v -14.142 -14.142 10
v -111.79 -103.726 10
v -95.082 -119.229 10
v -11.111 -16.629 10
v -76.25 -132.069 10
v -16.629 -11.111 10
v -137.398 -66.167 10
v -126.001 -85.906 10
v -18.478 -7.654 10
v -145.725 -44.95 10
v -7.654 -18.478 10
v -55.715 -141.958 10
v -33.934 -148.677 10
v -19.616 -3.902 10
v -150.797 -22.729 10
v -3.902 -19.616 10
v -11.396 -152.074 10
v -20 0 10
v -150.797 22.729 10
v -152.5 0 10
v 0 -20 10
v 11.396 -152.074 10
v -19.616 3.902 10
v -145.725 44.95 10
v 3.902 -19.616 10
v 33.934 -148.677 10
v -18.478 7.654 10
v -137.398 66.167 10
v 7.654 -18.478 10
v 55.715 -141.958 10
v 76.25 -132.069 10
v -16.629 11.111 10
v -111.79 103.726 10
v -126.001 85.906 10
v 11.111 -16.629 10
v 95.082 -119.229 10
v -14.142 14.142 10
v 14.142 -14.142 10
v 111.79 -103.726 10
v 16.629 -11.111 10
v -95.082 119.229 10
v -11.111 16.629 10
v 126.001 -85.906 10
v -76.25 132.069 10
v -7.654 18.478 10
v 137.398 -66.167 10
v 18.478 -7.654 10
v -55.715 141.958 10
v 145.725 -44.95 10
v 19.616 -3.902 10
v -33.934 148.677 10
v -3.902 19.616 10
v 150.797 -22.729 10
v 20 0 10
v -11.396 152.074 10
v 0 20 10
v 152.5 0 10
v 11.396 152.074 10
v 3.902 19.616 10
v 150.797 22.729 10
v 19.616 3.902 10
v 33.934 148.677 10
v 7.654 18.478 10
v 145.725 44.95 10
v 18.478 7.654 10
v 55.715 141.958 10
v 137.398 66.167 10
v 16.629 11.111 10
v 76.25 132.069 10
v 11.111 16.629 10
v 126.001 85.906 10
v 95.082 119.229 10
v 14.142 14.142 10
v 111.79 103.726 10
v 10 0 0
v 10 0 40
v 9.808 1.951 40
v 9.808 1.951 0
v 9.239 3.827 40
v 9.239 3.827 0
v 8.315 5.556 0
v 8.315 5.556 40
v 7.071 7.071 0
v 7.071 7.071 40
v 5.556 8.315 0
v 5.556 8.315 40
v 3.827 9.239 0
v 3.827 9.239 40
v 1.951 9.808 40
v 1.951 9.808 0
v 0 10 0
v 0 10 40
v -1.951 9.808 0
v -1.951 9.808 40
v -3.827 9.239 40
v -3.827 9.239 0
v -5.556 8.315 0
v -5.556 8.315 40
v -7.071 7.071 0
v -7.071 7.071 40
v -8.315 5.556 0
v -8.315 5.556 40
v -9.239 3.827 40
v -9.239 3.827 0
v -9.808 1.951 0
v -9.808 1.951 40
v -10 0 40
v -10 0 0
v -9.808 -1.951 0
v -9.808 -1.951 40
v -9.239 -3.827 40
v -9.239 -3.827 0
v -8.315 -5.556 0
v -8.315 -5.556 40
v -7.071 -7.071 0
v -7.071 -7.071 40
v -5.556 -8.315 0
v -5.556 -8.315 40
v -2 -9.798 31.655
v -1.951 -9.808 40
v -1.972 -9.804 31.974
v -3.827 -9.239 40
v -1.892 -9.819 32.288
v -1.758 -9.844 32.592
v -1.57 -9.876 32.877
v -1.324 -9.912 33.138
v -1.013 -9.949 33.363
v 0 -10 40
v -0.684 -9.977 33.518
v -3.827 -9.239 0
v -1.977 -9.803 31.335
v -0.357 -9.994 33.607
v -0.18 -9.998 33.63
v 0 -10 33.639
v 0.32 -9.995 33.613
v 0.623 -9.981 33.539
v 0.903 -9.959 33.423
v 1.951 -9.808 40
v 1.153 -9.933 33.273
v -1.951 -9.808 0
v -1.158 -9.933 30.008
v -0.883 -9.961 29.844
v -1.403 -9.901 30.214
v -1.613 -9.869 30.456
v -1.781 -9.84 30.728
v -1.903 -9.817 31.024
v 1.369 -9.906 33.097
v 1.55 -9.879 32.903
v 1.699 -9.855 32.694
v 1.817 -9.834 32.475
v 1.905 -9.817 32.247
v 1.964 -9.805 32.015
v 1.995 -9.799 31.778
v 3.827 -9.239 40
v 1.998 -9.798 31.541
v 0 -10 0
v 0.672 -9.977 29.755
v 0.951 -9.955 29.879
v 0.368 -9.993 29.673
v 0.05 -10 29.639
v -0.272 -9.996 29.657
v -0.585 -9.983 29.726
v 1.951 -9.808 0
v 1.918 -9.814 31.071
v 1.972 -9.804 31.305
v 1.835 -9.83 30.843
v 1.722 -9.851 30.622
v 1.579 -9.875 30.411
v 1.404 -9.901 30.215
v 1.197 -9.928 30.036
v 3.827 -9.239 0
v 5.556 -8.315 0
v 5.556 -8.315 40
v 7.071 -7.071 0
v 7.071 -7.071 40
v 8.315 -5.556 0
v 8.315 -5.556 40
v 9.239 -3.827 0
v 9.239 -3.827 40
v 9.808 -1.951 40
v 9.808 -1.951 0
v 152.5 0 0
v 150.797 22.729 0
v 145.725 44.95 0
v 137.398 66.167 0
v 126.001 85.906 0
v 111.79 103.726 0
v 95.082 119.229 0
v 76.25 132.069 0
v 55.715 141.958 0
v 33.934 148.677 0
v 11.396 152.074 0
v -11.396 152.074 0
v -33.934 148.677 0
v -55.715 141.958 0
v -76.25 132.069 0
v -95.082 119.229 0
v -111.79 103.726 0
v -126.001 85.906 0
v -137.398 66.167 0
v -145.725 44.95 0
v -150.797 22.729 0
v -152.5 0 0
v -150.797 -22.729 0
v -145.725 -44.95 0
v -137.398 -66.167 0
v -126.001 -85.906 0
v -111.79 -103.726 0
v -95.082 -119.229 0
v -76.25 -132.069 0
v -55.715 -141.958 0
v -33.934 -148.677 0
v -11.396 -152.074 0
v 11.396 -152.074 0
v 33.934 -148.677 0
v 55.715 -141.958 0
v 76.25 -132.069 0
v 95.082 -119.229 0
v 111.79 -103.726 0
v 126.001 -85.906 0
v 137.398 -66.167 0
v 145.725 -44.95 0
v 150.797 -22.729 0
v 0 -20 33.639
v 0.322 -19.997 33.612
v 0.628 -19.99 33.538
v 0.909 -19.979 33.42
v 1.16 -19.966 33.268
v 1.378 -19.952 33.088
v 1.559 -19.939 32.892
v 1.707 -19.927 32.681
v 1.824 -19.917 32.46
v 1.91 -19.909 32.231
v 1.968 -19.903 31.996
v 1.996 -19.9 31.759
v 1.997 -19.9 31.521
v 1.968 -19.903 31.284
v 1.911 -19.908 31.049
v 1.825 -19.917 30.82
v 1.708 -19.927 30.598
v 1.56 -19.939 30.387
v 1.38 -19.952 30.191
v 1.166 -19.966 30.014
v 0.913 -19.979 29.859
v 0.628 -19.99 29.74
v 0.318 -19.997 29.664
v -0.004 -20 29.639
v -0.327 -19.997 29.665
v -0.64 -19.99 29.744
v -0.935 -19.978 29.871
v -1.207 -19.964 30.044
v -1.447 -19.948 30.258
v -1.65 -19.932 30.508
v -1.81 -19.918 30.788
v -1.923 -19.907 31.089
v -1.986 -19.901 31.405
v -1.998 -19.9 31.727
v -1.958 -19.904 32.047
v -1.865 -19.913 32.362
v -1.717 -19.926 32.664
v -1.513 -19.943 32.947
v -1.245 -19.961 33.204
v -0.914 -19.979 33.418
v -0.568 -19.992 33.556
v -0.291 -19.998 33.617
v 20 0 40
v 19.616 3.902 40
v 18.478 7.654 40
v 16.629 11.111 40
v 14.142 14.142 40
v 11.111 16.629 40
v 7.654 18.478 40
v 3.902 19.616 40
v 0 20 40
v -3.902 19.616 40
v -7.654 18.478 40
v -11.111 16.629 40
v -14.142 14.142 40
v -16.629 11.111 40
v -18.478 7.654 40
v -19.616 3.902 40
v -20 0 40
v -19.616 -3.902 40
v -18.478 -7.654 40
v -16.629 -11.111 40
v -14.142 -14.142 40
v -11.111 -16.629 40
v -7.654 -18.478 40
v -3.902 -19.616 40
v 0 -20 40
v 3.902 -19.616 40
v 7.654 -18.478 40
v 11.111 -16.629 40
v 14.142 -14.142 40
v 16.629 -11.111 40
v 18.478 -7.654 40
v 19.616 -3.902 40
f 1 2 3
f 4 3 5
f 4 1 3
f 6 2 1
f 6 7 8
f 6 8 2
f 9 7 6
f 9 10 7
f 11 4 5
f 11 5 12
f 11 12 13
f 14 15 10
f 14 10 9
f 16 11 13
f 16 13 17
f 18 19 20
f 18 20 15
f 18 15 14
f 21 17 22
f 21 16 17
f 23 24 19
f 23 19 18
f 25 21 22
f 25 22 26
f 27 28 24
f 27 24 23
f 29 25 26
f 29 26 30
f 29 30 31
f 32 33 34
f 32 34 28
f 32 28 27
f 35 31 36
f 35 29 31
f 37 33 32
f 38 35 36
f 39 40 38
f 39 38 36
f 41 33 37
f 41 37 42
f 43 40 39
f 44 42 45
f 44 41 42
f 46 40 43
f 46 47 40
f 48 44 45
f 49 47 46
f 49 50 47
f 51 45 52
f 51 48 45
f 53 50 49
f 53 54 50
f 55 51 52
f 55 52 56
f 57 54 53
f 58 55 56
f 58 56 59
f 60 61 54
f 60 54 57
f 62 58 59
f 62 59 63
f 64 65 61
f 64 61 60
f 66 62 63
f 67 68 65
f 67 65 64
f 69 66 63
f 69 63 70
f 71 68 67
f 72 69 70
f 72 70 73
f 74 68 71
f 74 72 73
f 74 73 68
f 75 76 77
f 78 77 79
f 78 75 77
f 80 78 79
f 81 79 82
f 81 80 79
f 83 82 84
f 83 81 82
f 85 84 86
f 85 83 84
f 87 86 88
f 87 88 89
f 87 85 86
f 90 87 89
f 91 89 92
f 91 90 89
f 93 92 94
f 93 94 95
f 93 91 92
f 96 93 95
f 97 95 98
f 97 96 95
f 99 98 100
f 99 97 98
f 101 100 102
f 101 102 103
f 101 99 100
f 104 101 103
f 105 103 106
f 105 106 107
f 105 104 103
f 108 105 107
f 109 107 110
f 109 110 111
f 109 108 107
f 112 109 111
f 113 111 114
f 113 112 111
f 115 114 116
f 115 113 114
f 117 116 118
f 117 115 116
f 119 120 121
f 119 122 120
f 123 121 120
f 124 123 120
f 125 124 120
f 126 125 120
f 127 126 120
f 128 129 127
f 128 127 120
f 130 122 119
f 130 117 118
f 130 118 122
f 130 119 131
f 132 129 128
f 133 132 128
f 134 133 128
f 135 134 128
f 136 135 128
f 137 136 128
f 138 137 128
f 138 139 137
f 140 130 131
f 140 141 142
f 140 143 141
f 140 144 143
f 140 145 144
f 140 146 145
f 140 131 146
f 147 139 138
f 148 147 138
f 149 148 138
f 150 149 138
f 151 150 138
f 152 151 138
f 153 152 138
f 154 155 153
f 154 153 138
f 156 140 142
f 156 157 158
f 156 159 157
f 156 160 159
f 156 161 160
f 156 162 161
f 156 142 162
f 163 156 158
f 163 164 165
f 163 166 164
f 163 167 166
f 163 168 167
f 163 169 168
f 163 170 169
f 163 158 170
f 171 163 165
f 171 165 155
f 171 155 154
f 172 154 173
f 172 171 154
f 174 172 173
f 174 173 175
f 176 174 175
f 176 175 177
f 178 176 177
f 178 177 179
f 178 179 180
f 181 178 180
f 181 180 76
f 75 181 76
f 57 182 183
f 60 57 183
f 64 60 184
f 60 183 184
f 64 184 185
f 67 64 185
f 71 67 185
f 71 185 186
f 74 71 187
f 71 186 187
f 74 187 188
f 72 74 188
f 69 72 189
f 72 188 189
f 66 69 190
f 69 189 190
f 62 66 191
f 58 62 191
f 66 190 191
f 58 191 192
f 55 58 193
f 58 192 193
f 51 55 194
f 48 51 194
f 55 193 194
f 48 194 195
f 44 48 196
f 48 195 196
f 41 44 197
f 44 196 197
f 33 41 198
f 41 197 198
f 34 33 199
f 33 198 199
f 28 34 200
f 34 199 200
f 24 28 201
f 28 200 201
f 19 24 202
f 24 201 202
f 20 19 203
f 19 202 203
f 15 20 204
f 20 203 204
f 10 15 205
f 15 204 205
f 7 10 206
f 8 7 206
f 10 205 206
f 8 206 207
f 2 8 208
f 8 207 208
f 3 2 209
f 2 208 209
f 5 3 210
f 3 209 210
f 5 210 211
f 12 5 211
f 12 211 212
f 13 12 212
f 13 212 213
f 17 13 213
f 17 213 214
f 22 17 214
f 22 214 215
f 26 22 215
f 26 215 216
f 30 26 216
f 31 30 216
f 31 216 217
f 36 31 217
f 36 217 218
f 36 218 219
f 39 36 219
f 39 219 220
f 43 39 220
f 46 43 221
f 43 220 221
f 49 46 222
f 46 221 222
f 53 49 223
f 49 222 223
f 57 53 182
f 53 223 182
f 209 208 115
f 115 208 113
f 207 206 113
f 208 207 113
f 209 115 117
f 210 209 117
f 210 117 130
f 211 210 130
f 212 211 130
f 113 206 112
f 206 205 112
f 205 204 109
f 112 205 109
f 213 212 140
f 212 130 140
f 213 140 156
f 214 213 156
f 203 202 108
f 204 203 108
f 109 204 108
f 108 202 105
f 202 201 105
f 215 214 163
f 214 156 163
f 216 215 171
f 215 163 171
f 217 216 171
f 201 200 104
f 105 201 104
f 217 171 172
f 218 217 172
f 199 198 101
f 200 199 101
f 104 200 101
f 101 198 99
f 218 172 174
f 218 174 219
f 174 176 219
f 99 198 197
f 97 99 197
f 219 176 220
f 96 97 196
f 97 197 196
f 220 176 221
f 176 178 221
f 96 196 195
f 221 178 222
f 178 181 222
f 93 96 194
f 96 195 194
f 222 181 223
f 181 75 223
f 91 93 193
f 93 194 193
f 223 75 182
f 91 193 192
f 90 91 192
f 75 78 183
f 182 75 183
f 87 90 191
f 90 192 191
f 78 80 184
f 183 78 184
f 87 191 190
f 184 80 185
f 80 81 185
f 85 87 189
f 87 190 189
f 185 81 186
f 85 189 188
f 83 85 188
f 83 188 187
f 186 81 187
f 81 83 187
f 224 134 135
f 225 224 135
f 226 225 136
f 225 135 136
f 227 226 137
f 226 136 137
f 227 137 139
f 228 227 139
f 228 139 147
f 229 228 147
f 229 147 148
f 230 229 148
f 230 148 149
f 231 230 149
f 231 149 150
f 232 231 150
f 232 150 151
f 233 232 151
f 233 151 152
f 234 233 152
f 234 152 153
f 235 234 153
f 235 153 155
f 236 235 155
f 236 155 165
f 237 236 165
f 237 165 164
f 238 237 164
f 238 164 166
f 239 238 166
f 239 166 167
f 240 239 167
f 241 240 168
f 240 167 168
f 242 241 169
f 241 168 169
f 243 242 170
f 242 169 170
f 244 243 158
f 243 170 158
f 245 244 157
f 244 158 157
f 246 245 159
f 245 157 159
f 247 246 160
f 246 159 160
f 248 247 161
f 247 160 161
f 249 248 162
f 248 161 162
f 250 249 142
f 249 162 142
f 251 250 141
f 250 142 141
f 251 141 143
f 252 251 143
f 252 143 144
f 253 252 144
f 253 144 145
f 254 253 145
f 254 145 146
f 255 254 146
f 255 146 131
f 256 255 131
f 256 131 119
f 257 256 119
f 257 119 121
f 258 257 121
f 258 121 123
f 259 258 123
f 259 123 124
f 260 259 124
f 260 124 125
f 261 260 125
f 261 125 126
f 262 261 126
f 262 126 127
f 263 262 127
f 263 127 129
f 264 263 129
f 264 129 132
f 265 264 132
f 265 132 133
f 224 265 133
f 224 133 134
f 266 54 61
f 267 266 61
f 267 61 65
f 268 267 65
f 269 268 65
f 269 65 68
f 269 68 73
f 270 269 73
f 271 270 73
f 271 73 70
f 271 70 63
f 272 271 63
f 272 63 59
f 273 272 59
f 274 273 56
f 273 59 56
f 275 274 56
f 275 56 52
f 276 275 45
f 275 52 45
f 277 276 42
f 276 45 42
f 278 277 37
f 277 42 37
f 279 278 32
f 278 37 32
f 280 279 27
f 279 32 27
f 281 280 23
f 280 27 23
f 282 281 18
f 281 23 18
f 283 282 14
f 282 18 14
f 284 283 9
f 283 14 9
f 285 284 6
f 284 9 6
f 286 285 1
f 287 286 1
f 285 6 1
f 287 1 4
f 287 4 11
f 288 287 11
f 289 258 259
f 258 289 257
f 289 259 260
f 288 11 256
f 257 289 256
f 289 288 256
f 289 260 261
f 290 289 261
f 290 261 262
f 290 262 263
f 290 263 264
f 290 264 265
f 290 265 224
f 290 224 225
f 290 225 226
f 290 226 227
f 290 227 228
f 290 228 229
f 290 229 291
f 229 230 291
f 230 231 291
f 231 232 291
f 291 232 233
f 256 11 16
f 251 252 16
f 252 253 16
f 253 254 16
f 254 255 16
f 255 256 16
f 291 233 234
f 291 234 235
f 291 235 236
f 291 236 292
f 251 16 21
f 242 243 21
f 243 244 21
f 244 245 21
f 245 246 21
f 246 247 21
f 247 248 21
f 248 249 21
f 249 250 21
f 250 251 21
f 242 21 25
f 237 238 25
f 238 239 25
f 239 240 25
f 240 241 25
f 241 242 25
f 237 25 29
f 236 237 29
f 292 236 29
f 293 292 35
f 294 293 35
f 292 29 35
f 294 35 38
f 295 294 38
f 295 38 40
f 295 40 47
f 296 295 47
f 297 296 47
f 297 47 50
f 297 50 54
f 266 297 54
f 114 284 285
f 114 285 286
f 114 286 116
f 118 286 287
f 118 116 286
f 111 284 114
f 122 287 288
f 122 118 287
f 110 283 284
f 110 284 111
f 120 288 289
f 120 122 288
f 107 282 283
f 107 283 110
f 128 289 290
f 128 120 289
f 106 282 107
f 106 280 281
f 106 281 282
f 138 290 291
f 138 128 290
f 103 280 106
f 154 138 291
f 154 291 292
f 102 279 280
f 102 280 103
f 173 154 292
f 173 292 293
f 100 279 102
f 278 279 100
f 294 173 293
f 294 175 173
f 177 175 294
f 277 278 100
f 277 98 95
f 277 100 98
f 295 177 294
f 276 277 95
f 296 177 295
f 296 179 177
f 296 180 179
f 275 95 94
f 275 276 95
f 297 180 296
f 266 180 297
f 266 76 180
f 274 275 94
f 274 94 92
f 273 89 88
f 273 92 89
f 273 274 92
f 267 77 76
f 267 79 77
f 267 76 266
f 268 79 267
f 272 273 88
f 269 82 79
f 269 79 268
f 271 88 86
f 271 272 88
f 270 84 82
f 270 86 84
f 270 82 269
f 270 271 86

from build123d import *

# Parameters (mm, degrees)
SKETCH1_R           = 152.5
SKETCH1_R_2         = 10
BOSS_EXTRUDE1_DEPTH = 10
SKETCH2_R           = 20
SKETCH2_R_2         = 10
BOSS_EXTRUDE2_DEPTH = 30
SKETCH3_R           = 2
CUT_EXTRUDE1_DEPTH  = 60


with BuildPart() as part:
    # Sketch1 → Boss-Extrude1 (new body)
    with BuildSketch(Plane.XY):
        Circle(SKETCH1_R)
        Circle(SKETCH1_R_2, mode=Mode.SUBTRACT)
    extrude(amount=BOSS_EXTRUDE1_DEPTH)

    # Sketch2 → Boss-Extrude2 (add)
    with BuildSketch(Plane.XY.offset(10)):
        Circle(SKETCH2_R)
        Circle(SKETCH2_R_2, mode=Mode.SUBTRACT)
    extrude(amount=BOSS_EXTRUDE2_DEPTH)

    # Sketch3 → Cut-Extrude1 (cut)
    with BuildSketch(Plane(origin=(0, 0, 0), x_dir=(1, 0, 0), z_dir=(0, 1, 0))):
        with Locations(Location((0, -31.638618724, 0), (0, 0, 270))):  # turned: the seam where the file's is
            Circle(SKETCH3_R)
    extrude(amount=-CUT_EXTRUDE1_DEPTH, mode=Mode.SUBTRACT)


solid = part.part
